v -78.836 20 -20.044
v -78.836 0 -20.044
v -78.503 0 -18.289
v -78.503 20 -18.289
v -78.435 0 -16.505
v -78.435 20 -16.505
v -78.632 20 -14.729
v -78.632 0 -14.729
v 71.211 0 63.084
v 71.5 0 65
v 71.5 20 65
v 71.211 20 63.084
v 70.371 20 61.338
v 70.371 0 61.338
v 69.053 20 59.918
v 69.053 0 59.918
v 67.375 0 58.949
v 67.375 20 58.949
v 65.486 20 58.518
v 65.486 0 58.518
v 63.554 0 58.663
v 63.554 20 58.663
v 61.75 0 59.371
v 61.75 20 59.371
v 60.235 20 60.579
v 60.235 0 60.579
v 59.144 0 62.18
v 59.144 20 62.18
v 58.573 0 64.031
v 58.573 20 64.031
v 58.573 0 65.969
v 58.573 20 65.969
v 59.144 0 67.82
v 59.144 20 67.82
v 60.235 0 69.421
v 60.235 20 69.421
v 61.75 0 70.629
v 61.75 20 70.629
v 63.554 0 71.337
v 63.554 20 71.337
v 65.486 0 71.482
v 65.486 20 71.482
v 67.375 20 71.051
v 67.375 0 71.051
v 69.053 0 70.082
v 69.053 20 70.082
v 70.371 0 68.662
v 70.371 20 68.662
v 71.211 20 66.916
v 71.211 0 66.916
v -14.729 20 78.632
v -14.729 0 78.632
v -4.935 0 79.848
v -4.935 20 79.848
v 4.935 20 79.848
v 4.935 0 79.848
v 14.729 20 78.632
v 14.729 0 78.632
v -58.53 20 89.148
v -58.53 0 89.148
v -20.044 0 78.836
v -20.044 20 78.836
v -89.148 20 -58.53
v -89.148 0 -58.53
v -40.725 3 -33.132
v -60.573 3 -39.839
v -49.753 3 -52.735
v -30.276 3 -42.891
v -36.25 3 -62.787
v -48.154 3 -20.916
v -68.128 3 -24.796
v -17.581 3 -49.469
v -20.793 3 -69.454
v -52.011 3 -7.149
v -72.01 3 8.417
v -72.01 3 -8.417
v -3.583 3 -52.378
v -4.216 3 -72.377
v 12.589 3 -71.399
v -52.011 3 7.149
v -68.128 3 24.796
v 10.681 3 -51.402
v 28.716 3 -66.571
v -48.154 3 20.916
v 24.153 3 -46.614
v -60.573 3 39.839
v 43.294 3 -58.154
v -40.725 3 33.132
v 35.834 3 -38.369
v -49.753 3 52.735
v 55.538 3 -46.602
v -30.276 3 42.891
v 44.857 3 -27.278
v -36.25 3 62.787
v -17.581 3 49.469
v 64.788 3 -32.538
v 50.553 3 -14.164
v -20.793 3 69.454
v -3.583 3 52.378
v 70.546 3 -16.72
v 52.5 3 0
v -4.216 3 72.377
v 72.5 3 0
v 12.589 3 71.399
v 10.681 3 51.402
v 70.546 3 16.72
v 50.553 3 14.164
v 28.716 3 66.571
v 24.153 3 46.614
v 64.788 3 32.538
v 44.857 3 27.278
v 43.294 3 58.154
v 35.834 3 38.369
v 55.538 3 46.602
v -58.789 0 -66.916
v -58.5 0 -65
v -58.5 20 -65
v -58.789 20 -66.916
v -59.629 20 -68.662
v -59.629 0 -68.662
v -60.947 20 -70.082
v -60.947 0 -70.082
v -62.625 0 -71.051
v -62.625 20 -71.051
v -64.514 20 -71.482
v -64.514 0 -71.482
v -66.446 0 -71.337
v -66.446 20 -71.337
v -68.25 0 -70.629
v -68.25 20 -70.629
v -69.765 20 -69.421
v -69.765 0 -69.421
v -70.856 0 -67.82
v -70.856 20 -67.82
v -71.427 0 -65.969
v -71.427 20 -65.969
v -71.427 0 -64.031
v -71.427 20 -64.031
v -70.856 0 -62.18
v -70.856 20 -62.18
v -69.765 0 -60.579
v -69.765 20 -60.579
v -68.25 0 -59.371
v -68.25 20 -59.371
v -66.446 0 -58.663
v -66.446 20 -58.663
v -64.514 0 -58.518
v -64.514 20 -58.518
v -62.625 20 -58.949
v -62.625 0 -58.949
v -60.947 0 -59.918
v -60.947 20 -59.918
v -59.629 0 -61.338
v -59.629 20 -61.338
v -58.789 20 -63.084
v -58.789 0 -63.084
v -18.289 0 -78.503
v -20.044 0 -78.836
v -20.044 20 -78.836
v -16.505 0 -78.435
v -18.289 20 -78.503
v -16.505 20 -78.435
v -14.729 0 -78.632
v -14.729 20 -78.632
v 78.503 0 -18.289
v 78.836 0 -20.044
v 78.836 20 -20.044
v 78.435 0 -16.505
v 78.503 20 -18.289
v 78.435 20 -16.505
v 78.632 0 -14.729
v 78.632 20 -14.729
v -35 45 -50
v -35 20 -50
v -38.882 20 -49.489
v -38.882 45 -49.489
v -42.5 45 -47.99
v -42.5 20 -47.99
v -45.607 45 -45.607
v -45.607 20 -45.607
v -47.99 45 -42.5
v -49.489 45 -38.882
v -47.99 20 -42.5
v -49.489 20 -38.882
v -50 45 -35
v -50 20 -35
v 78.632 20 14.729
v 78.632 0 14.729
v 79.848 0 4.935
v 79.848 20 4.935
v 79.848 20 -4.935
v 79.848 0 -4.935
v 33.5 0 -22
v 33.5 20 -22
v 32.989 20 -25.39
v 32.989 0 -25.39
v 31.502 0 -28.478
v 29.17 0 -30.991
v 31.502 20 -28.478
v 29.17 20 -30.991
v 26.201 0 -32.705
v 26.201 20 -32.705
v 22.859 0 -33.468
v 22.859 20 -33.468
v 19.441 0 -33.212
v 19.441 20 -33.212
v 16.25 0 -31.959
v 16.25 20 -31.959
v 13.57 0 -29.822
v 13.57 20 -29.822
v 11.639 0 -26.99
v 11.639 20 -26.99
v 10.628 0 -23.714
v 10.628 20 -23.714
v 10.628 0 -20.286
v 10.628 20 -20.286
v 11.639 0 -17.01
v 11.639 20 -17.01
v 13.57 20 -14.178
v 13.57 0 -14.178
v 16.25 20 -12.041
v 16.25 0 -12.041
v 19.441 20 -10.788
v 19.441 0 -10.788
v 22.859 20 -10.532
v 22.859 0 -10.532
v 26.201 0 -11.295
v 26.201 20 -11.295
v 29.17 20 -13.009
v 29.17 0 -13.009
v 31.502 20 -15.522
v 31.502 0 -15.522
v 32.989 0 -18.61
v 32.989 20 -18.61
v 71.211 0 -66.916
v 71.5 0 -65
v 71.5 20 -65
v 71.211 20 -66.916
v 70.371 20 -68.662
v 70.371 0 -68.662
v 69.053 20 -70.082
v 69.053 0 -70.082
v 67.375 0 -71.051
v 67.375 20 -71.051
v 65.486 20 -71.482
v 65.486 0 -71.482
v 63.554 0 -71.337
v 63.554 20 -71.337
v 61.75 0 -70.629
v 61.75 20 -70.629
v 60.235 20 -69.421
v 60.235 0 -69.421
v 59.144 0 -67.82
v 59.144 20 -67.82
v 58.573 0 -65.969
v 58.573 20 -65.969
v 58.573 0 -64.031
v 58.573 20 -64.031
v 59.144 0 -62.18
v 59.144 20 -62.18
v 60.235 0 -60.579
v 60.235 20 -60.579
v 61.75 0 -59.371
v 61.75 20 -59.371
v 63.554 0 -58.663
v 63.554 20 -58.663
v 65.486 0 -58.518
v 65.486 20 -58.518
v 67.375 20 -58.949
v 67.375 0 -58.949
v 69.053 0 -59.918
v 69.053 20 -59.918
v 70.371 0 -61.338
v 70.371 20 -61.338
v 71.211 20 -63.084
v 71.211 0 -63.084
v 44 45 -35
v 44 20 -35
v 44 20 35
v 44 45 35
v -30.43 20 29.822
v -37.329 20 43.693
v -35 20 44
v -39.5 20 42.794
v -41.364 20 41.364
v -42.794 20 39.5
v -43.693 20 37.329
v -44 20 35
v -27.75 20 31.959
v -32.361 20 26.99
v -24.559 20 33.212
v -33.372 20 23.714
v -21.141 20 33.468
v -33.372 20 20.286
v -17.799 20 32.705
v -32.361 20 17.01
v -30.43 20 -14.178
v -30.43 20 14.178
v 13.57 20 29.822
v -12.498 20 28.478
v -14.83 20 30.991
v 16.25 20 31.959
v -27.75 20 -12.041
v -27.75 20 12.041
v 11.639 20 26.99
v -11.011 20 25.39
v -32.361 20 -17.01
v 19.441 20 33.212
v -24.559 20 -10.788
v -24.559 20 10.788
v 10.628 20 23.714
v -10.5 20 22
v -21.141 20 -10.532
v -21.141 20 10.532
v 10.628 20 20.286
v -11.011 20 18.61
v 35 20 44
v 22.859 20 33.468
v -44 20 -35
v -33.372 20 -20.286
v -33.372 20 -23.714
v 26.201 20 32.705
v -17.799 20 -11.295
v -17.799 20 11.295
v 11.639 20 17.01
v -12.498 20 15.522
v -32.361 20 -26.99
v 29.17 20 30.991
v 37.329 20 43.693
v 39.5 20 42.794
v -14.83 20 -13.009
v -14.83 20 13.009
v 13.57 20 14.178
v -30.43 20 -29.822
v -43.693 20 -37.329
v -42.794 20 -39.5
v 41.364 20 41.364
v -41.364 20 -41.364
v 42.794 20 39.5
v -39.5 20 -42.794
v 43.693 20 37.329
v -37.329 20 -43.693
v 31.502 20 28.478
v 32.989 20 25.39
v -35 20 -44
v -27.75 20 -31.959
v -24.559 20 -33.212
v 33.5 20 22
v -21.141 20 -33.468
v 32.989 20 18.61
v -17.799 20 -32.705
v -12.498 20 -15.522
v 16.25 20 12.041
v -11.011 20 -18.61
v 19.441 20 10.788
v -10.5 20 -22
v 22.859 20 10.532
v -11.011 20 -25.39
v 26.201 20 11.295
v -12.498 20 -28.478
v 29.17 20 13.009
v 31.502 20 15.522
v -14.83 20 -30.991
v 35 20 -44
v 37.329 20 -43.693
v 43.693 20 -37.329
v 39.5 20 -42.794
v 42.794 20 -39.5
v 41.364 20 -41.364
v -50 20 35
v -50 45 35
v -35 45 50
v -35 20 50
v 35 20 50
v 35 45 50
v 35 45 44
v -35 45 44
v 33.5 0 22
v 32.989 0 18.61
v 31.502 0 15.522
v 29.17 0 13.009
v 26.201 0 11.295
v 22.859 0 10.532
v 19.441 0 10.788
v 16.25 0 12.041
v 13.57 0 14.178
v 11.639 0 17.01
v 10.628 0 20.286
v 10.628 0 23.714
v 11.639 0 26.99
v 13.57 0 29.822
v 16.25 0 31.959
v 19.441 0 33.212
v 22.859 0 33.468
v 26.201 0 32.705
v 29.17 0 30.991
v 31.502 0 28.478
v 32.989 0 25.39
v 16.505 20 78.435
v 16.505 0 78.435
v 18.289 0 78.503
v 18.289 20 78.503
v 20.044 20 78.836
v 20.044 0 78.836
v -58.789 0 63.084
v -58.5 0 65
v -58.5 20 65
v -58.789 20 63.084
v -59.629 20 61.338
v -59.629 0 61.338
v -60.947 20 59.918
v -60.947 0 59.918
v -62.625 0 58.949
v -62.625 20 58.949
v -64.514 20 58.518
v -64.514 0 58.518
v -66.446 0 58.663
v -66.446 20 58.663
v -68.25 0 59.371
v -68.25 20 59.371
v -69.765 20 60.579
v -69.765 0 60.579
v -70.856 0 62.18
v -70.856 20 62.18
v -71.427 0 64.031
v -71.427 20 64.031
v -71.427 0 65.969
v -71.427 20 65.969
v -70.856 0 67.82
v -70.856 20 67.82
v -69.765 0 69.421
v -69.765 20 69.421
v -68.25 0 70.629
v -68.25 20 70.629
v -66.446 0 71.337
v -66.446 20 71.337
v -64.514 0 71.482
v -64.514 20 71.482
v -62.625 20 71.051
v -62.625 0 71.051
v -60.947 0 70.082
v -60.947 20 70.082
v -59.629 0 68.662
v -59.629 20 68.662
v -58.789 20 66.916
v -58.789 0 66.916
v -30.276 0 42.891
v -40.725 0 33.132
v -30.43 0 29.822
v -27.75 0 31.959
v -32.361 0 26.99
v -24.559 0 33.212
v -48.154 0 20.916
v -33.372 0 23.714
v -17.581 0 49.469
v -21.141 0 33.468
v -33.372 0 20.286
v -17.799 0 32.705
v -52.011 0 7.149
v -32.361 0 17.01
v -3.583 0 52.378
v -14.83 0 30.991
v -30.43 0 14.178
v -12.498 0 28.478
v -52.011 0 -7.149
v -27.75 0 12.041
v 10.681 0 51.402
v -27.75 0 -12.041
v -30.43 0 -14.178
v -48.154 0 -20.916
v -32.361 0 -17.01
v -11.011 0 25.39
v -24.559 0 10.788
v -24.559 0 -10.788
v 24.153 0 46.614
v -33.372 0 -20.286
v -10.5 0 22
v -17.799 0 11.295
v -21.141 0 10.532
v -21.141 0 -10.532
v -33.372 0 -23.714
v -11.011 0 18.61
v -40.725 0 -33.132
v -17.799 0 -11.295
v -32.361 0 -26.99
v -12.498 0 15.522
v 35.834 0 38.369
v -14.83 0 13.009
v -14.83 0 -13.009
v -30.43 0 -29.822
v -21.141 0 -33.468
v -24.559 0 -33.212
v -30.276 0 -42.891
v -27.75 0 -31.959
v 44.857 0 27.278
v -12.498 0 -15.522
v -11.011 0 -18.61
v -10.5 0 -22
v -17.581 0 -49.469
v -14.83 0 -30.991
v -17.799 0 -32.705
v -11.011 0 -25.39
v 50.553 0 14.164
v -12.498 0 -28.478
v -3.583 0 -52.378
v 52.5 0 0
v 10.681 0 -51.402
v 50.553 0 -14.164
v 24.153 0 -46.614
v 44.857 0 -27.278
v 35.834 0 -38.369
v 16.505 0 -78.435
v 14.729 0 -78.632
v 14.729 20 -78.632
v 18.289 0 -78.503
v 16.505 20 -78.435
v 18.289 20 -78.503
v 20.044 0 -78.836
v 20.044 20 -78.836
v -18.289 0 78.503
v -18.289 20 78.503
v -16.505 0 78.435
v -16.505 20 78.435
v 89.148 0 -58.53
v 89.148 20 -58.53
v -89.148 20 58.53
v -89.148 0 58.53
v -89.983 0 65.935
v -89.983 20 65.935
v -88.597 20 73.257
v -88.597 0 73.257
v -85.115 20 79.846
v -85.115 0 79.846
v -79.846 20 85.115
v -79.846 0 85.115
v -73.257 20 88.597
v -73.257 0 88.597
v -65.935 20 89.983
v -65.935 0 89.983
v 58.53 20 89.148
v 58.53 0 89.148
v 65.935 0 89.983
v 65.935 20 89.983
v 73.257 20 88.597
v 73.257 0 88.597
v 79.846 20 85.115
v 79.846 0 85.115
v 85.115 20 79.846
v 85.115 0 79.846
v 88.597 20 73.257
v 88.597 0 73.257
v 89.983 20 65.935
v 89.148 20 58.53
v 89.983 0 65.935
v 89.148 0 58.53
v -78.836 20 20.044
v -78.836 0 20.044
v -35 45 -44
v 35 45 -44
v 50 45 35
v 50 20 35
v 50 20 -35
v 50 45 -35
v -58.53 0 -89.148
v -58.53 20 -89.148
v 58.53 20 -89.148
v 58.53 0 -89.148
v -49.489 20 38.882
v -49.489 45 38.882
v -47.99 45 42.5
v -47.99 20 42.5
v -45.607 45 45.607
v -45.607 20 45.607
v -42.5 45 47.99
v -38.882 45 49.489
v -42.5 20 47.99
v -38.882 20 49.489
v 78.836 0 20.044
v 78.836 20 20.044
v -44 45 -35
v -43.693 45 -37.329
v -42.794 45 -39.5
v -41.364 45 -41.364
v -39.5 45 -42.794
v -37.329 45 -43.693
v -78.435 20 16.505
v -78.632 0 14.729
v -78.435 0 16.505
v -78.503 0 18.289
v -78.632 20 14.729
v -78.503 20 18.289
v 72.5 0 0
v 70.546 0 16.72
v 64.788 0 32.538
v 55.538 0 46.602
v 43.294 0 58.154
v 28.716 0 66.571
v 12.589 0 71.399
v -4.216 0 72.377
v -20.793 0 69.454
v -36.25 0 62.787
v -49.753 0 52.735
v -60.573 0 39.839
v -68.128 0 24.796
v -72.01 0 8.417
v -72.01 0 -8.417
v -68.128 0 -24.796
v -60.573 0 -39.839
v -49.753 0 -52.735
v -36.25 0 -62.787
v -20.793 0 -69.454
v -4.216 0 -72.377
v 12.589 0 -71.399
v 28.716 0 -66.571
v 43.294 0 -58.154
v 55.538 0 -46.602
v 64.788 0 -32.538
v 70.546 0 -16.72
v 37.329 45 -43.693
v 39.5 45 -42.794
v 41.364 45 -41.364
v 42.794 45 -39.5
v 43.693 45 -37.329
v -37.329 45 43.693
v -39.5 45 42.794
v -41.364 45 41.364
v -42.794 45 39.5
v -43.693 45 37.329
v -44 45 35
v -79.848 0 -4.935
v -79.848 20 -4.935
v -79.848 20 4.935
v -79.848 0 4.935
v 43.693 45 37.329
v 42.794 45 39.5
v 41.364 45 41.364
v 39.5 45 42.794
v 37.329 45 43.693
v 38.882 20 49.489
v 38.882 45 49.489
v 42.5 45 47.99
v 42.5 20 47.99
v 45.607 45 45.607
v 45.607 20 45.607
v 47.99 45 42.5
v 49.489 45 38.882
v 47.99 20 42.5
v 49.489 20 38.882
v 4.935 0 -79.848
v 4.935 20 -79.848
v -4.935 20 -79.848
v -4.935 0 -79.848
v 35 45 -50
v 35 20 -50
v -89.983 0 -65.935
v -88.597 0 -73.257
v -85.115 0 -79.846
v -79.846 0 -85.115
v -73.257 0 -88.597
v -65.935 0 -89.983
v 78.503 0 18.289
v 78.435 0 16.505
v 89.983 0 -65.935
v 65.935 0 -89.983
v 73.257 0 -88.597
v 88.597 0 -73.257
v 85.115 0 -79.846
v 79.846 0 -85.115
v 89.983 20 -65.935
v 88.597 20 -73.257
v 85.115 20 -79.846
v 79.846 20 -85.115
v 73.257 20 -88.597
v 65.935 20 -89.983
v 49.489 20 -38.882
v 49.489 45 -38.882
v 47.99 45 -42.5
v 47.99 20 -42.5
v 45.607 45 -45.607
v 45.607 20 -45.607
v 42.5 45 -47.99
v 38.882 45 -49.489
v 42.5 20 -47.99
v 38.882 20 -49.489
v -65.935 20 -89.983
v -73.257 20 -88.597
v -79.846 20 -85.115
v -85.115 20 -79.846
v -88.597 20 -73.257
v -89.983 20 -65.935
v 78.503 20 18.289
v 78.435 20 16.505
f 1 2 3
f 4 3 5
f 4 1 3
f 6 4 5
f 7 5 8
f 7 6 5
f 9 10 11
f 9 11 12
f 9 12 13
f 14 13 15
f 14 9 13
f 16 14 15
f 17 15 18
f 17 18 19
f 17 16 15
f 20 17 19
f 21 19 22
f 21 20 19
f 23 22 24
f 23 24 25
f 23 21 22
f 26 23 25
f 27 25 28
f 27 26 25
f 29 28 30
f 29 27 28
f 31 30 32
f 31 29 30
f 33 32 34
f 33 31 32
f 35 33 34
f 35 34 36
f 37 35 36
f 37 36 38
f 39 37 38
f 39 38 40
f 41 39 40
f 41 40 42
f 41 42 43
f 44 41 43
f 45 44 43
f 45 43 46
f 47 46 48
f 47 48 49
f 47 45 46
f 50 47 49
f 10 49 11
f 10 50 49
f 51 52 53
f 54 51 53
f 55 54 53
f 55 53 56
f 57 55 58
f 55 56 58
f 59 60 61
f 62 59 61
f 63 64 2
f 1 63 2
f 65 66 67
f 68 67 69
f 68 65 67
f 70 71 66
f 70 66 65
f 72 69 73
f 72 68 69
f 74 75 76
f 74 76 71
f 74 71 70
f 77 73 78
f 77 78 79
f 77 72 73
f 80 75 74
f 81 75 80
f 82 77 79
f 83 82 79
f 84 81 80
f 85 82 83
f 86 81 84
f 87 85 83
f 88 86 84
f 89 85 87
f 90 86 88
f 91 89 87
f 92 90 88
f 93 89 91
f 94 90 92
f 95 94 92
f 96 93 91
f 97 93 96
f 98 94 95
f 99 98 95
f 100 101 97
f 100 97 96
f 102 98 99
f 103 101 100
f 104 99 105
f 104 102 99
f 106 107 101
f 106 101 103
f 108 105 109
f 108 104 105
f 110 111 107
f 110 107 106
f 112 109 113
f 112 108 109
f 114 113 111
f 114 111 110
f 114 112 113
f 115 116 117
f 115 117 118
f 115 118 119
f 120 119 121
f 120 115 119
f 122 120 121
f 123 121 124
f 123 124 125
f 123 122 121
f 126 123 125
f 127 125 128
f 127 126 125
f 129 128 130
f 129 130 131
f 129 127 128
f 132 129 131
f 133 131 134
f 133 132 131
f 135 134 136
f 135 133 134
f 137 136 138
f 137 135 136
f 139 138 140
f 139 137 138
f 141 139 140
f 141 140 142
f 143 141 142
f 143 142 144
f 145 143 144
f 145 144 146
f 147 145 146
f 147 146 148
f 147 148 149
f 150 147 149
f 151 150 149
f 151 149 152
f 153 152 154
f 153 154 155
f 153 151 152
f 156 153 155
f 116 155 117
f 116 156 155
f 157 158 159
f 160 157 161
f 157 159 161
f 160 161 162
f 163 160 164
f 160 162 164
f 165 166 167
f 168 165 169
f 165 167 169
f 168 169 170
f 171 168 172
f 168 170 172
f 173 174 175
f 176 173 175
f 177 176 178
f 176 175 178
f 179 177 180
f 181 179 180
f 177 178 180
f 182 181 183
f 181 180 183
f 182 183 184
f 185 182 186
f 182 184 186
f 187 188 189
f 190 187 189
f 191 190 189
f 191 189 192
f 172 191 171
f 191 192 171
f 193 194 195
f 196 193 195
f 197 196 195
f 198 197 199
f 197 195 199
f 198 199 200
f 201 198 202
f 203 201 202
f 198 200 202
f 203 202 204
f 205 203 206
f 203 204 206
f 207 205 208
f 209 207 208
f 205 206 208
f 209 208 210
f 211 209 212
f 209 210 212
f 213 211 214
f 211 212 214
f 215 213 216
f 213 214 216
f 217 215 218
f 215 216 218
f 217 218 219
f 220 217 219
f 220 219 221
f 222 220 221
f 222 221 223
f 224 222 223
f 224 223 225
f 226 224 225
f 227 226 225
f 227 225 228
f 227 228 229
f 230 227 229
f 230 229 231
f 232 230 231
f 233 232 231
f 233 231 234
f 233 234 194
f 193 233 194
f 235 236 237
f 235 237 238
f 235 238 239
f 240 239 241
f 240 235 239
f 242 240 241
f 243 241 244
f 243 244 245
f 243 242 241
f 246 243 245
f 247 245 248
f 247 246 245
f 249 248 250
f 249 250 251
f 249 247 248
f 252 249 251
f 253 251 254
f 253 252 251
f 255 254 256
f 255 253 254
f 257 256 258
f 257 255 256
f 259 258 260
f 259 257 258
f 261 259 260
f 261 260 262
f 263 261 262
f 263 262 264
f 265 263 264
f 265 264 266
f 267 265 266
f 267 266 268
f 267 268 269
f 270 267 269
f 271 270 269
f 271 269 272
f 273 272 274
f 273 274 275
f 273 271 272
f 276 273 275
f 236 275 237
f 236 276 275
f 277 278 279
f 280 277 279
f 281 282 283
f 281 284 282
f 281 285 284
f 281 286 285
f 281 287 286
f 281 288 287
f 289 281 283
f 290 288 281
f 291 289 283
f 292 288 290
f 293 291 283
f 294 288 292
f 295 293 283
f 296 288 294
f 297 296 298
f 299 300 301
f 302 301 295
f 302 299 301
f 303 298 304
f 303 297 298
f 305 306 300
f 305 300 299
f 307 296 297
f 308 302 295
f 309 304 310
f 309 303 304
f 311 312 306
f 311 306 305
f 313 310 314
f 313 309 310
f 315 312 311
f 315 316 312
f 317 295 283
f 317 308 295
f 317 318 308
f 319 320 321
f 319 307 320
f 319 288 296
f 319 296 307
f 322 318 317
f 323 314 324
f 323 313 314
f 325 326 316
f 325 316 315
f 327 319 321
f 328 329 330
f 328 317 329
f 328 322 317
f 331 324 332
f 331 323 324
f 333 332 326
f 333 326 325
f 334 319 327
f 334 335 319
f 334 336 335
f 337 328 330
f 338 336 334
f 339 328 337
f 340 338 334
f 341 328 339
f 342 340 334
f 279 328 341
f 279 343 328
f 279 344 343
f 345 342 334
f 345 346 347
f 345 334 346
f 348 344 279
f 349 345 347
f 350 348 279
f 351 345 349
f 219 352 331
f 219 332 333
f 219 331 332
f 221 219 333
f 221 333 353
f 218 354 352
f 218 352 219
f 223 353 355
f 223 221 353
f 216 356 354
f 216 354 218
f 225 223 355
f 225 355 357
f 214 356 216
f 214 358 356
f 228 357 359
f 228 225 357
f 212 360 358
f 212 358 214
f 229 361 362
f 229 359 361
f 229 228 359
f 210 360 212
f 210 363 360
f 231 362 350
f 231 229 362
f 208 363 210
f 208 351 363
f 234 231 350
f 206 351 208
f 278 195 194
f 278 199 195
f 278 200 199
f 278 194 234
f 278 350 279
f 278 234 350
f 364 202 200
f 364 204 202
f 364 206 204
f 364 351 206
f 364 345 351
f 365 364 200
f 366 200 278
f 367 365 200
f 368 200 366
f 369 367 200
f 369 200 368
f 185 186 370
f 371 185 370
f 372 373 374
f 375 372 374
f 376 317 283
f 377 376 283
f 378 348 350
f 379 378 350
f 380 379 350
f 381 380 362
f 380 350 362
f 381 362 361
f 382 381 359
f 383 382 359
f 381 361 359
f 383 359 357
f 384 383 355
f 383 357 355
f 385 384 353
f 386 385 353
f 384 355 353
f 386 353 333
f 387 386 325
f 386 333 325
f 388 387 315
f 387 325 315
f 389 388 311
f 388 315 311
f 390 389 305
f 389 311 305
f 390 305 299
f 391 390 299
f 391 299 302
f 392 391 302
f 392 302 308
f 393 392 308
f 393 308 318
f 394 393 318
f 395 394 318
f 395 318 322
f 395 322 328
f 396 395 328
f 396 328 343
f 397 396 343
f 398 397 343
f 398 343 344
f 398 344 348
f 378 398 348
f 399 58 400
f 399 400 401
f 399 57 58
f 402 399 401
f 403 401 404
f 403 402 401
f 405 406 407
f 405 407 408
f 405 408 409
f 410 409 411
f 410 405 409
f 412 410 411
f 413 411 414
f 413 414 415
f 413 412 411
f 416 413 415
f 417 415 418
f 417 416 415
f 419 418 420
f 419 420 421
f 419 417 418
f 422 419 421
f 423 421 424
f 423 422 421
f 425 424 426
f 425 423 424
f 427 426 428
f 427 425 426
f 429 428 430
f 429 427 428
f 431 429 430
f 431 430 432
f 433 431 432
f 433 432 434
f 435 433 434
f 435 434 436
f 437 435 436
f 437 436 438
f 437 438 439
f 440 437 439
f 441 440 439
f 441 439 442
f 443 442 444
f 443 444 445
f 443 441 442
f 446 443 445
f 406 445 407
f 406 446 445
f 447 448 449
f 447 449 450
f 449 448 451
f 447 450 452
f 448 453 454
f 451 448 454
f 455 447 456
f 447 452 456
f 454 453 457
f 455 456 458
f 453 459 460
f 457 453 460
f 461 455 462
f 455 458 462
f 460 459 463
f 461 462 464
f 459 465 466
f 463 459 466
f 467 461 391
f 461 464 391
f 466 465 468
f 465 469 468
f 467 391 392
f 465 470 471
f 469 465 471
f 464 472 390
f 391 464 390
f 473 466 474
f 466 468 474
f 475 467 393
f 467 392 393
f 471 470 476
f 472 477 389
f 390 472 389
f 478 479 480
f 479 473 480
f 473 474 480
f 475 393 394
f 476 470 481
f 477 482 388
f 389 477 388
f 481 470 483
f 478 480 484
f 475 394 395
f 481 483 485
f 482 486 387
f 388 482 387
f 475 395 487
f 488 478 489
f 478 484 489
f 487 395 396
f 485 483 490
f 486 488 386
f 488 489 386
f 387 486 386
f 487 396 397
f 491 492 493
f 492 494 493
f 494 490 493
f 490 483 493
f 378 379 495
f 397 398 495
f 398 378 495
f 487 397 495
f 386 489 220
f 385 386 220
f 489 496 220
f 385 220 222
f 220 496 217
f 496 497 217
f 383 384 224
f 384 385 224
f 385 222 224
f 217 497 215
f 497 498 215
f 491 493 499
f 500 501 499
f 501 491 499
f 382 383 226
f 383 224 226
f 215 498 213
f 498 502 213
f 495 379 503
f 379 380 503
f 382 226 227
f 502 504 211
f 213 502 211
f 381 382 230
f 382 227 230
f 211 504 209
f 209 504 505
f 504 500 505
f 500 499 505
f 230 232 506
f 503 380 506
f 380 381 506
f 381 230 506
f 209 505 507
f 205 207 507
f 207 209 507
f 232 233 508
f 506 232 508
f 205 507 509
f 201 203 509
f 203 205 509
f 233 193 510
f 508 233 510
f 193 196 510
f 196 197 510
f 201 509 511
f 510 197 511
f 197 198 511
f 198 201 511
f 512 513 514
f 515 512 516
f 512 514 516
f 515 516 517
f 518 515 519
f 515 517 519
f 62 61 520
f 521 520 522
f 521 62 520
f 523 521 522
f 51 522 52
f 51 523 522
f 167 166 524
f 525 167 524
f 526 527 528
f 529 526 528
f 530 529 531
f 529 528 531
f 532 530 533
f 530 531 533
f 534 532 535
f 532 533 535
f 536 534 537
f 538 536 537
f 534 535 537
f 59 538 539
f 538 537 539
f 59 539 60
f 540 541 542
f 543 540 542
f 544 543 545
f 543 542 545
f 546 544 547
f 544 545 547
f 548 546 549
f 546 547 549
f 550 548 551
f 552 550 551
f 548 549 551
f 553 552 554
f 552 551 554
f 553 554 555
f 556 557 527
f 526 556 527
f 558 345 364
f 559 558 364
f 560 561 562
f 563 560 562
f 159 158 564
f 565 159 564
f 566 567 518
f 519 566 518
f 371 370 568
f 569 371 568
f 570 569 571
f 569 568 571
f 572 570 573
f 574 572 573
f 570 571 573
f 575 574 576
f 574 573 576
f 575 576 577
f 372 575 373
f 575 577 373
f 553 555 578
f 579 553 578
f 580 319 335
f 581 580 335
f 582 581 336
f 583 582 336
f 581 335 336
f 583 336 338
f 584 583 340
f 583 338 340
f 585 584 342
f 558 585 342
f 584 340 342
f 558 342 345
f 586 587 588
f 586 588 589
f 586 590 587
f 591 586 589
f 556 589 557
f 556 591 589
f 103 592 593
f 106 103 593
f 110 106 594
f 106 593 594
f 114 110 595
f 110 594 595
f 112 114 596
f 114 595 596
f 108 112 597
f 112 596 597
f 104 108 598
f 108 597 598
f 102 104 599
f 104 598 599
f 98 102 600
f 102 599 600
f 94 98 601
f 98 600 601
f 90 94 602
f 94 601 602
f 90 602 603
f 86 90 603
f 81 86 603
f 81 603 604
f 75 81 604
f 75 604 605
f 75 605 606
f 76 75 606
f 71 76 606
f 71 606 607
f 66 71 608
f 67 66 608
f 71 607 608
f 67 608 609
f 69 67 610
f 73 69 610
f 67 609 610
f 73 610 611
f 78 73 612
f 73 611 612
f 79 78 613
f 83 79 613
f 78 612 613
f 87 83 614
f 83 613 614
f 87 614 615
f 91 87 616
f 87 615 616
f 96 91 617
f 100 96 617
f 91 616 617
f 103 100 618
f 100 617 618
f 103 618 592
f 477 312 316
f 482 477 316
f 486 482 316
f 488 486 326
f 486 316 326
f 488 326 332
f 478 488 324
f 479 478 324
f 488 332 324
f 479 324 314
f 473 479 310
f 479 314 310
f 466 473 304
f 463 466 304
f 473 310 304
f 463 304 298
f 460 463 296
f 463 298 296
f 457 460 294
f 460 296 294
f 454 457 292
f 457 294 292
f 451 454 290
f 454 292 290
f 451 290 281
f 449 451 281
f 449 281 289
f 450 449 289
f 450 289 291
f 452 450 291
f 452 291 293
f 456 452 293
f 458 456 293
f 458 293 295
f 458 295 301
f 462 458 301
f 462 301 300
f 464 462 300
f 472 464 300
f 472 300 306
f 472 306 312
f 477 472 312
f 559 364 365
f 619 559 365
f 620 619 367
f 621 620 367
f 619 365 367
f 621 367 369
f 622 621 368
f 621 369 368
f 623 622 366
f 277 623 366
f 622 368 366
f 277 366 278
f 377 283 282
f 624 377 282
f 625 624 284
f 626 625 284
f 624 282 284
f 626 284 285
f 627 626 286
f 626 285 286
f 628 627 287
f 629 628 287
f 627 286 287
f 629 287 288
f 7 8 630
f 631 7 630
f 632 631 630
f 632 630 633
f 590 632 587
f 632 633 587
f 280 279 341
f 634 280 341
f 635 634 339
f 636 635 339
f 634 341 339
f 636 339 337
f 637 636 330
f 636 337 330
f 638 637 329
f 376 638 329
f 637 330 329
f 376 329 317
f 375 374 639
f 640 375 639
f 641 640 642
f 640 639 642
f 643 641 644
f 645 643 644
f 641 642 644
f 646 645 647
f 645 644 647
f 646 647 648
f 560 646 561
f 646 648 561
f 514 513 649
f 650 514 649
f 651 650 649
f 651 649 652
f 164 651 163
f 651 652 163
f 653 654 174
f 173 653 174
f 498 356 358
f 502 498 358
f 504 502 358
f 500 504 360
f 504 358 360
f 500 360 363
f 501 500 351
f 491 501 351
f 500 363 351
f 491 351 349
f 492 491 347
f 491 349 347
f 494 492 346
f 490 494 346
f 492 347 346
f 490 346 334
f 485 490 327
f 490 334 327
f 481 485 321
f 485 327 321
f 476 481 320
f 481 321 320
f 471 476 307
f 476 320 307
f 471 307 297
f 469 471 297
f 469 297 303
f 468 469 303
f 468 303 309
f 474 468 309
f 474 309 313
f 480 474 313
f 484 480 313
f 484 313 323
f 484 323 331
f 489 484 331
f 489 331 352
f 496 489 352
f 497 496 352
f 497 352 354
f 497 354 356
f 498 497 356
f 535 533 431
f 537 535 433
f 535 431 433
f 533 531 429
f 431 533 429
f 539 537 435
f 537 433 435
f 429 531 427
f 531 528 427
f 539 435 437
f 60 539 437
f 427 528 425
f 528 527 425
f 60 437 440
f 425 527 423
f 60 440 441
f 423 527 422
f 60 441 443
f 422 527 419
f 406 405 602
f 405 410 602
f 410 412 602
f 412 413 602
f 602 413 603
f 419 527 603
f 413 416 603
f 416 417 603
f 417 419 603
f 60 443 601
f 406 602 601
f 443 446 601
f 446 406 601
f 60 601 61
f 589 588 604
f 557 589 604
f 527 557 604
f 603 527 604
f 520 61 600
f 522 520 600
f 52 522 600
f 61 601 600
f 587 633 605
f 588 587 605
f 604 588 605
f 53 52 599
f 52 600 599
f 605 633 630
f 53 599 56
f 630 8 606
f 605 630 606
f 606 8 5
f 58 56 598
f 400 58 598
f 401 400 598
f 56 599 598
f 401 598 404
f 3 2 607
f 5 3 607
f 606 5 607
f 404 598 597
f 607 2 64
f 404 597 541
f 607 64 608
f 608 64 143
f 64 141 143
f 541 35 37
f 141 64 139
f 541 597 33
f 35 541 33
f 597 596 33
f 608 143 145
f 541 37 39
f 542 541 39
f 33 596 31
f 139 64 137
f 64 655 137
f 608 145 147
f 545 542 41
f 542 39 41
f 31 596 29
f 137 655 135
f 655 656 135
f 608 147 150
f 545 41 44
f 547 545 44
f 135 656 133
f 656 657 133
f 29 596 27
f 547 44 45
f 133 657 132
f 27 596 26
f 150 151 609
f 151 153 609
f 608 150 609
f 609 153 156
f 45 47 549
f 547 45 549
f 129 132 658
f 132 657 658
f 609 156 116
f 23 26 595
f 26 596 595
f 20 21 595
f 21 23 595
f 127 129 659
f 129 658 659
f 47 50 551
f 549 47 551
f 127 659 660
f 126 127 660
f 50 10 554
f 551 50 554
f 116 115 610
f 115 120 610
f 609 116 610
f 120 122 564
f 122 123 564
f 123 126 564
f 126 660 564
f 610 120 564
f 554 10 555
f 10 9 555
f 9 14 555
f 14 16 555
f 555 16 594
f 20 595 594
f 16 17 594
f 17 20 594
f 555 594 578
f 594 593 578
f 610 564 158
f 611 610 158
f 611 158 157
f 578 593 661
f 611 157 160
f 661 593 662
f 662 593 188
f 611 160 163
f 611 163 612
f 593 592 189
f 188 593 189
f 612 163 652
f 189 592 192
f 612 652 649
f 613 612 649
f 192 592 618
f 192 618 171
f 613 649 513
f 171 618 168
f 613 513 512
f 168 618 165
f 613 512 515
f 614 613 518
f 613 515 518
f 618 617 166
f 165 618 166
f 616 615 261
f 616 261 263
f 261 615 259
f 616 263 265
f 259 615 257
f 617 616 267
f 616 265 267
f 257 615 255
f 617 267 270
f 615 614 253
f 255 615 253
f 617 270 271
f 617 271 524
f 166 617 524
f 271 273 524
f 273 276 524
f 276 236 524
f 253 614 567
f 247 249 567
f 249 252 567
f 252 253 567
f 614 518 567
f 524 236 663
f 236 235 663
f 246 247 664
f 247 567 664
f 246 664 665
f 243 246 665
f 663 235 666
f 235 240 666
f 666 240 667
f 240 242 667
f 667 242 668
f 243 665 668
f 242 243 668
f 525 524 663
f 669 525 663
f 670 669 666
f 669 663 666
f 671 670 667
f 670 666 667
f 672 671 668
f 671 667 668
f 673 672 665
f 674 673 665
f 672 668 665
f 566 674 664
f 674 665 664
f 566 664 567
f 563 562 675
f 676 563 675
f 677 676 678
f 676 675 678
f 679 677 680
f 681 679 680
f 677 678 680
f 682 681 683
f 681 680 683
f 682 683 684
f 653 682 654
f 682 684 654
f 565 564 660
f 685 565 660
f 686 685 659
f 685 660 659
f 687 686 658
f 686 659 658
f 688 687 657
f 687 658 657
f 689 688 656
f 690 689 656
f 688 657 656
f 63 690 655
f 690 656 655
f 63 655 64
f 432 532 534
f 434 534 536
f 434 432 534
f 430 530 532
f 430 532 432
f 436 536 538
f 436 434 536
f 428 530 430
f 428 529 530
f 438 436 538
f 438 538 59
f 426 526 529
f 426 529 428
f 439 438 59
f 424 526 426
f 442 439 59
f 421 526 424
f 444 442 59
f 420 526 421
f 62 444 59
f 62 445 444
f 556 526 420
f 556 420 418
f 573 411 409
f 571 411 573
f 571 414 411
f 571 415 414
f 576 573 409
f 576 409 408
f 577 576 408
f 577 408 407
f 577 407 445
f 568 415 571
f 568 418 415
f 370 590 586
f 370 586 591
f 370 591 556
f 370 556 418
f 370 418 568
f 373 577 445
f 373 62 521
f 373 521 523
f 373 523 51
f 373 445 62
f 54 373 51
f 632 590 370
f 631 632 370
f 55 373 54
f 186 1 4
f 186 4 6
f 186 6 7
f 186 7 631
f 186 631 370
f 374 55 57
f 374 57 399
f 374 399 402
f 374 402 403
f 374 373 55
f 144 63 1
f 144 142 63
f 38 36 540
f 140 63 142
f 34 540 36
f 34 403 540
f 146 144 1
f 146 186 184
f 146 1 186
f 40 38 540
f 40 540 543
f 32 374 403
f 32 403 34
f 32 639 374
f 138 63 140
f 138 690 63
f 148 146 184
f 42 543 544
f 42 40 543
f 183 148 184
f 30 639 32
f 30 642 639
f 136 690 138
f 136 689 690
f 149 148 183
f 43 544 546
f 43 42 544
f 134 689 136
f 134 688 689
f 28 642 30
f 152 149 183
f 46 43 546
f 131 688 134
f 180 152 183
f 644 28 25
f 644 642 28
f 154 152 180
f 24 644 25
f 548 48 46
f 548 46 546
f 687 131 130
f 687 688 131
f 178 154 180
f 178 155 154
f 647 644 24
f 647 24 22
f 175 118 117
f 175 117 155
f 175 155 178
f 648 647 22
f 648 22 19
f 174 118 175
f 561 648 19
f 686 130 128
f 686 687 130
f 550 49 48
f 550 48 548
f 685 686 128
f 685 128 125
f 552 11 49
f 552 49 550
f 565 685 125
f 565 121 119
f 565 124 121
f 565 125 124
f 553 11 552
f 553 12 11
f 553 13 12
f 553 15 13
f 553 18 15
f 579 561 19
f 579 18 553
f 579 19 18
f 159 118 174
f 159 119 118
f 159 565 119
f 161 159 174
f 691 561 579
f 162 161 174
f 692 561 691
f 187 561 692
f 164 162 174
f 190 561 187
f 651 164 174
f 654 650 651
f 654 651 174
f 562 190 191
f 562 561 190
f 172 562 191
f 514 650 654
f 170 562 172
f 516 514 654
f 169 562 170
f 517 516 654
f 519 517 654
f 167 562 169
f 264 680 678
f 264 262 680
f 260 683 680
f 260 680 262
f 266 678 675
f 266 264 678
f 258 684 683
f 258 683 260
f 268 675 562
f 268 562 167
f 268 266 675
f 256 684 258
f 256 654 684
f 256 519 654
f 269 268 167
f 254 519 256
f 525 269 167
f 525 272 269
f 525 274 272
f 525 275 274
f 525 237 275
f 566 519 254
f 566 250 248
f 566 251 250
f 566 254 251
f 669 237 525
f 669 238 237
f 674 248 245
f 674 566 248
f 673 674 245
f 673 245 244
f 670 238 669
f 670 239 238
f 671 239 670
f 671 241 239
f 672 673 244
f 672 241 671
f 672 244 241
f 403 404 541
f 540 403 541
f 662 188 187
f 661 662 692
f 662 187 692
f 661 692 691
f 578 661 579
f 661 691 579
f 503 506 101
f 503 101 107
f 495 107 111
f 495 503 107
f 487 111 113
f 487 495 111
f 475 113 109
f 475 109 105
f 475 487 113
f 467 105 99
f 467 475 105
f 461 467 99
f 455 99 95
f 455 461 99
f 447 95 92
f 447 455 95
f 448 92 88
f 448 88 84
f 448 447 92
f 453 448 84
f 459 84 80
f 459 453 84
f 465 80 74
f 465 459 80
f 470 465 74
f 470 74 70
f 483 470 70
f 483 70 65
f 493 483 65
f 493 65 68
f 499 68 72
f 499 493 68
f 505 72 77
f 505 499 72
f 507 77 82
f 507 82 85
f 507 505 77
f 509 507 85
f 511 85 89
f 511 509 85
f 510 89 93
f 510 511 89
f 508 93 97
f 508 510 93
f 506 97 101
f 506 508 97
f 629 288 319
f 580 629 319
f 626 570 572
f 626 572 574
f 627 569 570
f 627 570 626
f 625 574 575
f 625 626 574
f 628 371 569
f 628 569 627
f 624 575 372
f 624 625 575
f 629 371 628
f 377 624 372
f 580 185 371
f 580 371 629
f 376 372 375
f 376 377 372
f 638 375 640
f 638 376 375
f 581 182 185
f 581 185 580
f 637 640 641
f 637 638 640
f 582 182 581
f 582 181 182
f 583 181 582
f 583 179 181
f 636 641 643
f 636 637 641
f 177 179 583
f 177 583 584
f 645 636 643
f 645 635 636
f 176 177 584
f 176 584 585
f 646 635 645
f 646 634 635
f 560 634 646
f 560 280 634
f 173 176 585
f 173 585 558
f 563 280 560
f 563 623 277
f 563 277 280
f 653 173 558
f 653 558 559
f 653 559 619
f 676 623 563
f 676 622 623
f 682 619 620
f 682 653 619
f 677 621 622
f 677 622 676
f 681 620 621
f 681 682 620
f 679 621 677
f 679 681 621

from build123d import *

# Parameters (mm, degrees)
SKETCH1_R           = 6.5
BOSS_EXTRUDE1_DEPTH = 20
SKETCH2_R           = 11.5
CUT_EXTRUDE1_DEPTH  = 21
BOSS_EXTRUDE2_DEPTH = 25
SKETCH3_R           = 72.5
SKETCH3_R_2         = 52.5
CUT_EXTRUDE2_DEPTH  = 3
FILLET2_R           = 12


with BuildPart() as part:
    # Sketch1 → Boss-Extrude1 (new body)
    with BuildSketch(Plane(origin=(0, 0, 0), x_dir=(1, 0, 0), z_dir=(0, 1, 0))):
        with BuildLine():
            Line((-89.148145657, 58.529523872), (-78.104184034, 17.312897978))
            ThreePointArc((-78.104184034, 17.312897978), (-80, 0), (-78.104184034, -17.312897978))
            Line((-78.104184034, -17.312897978), (-89.148145657, -58.529523872))
            ThreePointArc((-89.148145657, -58.529523872), (-82.67766953, -82.67766953), (-58.529523872, -89.148145657))
            Line((-58.529523872, -89.148145657), (-17.312897978, -78.104184034))
            ThreePointArc((-17.312897978, -78.104184034), (0, -80), (17.312897978, -78.104184034))
            Line((17.312897978, -78.104184034), (58.529523872, -89.148145657))
            ThreePointArc((58.529523872, -89.148145657), (82.67766953, -82.67766953), (89.148145657, -58.529523872))
            Line((89.148145657, -58.529523872), (78.104184034, -17.312897978))
            ThreePointArc((78.104184034, -17.312897978), (80, 0), (78.104184034, 17.312897978))
            Line((78.104184034, 17.312897978), (89.148145657, 58.529523872))
            ThreePointArc((89.148145657, 58.529523872), (82.67766953, 82.67766953), (58.529523872, 89.148145657))
            Line((58.529523872, 89.148145657), (17.312897978, 78.104184034))
            ThreePointArc((17.312897978, 78.104184034), (0, 80), (-17.312897978, 78.104184034))
            Line((-17.312897978, 78.104184034), (-58.529523872, 89.148145657))
            ThreePointArc((-58.529523872, 89.148145657), (-82.67766953, 82.67766953), (-89.148145657, 58.529523872))
        make_face()
        with Locations((-65, 65)):
            Circle(SKETCH1_R, mode=Mode.SUBTRACT)
        with Locations((65, 65)):
            Circle(SKETCH1_R, mode=Mode.SUBTRACT)
        with Locations((65, -65)):
            Circle(SKETCH1_R, mode=Mode.SUBTRACT)
        with Locations((-65, -65)):
            Circle(SKETCH1_R, mode=Mode.SUBTRACT)
    extrude(amount=BOSS_EXTRUDE1_DEPTH)

    # Sketch2 → Cut-Extrude1 (cut, through all)
    with BuildSketch(Plane(origin=(0, 20, 0), x_dir=(1, 0, 0), z_dir=(0, 1, 0))):
        with Locations((-22, -22)):
            Circle(SKETCH2_R)
        with Locations((-22, 22)):
            Circle(SKETCH2_R)
        with Locations((22, 22)):
            Circle(SKETCH2_R)
        with Locations((22, -22)):
            Circle(SKETCH2_R)
    extrude(amount=-CUT_EXTRUDE1_DEPTH, mode=Mode.SUBTRACT)

    # Sketch2<3> → Boss-Extrude2 (add)
    with BuildSketch(Plane(origin=(0, 20, 0), x_dir=(1, 0, 0), z_dir=(0, 1, 0))):
        with BuildLine():
            Line((-35, -50), (35, -50))
            ThreePointArc((35, -50), (45.606601718, -45.606601718), (50, -35))
            Line((50, -35), (50, 35))
            ThreePointArc((50, 35), (45.606601718, 45.606601718), (35, 50))
            Line((35, 50), (-35, 50))
            ThreePointArc((-35, 50), (-45.606601718, 45.606601718), (-50, 35))
            Line((-50, 35), (-50, -35))
            ThreePointArc((-50, -35), (-45.606601718, -45.606601718), (-35, -50))
        make_face()
        with BuildLine():
            Line((-44, -35), (-44, 35))
            ThreePointArc((-44, 35), (-41.363961031, 41.363961031), (-35, 44))
            Line((-35, 44), (35, 44))
            ThreePointArc((35, 44), (41.363961031, 41.363961031), (44, 35))
            Line((44, 35), (44, -35))
            ThreePointArc((44, -35), (41.363961031, -41.363961031), (35, -44))
            Line((35, -44), (-35, -44))
            ThreePointArc((-35, -44), (-41.363961031, -41.363961031), (-44, -35))
        make_face(mode=Mode.SUBTRACT)
    extrude(amount=BOSS_EXTRUDE2_DEPTH)

    # Sketch3 → Cut-Extrude2 (cut)
    with BuildSketch(Plane.XZ):
        Circle(SKETCH3_R)
        Circle(SKETCH3_R_2, mode=Mode.SUBTRACT)
    extrude(amount=-CUT_EXTRUDE2_DEPTH, mode=Mode.SUBTRACT)

    # Fillet2
    fillet2_edges = [part.edges().sort_by_distance(p)[0] for p in [
        (-17.312897978, 10, -78.104184034),
        (17.312897978, 10, -78.104184034),
        (78.104184034, 10, -17.312897978),
        (78.104184034, 10, 17.312897978),
        (17.312897978, 10, 78.104184034),
        (-17.312897978, 10, 78.104184034),
        (-78.104184034, 10, 17.312897978),
        (-78.104184034, 10, -17.312897978),
    ]]
    fillet(fillet2_edges, radius=FILLET2_R)


solid = part.part
